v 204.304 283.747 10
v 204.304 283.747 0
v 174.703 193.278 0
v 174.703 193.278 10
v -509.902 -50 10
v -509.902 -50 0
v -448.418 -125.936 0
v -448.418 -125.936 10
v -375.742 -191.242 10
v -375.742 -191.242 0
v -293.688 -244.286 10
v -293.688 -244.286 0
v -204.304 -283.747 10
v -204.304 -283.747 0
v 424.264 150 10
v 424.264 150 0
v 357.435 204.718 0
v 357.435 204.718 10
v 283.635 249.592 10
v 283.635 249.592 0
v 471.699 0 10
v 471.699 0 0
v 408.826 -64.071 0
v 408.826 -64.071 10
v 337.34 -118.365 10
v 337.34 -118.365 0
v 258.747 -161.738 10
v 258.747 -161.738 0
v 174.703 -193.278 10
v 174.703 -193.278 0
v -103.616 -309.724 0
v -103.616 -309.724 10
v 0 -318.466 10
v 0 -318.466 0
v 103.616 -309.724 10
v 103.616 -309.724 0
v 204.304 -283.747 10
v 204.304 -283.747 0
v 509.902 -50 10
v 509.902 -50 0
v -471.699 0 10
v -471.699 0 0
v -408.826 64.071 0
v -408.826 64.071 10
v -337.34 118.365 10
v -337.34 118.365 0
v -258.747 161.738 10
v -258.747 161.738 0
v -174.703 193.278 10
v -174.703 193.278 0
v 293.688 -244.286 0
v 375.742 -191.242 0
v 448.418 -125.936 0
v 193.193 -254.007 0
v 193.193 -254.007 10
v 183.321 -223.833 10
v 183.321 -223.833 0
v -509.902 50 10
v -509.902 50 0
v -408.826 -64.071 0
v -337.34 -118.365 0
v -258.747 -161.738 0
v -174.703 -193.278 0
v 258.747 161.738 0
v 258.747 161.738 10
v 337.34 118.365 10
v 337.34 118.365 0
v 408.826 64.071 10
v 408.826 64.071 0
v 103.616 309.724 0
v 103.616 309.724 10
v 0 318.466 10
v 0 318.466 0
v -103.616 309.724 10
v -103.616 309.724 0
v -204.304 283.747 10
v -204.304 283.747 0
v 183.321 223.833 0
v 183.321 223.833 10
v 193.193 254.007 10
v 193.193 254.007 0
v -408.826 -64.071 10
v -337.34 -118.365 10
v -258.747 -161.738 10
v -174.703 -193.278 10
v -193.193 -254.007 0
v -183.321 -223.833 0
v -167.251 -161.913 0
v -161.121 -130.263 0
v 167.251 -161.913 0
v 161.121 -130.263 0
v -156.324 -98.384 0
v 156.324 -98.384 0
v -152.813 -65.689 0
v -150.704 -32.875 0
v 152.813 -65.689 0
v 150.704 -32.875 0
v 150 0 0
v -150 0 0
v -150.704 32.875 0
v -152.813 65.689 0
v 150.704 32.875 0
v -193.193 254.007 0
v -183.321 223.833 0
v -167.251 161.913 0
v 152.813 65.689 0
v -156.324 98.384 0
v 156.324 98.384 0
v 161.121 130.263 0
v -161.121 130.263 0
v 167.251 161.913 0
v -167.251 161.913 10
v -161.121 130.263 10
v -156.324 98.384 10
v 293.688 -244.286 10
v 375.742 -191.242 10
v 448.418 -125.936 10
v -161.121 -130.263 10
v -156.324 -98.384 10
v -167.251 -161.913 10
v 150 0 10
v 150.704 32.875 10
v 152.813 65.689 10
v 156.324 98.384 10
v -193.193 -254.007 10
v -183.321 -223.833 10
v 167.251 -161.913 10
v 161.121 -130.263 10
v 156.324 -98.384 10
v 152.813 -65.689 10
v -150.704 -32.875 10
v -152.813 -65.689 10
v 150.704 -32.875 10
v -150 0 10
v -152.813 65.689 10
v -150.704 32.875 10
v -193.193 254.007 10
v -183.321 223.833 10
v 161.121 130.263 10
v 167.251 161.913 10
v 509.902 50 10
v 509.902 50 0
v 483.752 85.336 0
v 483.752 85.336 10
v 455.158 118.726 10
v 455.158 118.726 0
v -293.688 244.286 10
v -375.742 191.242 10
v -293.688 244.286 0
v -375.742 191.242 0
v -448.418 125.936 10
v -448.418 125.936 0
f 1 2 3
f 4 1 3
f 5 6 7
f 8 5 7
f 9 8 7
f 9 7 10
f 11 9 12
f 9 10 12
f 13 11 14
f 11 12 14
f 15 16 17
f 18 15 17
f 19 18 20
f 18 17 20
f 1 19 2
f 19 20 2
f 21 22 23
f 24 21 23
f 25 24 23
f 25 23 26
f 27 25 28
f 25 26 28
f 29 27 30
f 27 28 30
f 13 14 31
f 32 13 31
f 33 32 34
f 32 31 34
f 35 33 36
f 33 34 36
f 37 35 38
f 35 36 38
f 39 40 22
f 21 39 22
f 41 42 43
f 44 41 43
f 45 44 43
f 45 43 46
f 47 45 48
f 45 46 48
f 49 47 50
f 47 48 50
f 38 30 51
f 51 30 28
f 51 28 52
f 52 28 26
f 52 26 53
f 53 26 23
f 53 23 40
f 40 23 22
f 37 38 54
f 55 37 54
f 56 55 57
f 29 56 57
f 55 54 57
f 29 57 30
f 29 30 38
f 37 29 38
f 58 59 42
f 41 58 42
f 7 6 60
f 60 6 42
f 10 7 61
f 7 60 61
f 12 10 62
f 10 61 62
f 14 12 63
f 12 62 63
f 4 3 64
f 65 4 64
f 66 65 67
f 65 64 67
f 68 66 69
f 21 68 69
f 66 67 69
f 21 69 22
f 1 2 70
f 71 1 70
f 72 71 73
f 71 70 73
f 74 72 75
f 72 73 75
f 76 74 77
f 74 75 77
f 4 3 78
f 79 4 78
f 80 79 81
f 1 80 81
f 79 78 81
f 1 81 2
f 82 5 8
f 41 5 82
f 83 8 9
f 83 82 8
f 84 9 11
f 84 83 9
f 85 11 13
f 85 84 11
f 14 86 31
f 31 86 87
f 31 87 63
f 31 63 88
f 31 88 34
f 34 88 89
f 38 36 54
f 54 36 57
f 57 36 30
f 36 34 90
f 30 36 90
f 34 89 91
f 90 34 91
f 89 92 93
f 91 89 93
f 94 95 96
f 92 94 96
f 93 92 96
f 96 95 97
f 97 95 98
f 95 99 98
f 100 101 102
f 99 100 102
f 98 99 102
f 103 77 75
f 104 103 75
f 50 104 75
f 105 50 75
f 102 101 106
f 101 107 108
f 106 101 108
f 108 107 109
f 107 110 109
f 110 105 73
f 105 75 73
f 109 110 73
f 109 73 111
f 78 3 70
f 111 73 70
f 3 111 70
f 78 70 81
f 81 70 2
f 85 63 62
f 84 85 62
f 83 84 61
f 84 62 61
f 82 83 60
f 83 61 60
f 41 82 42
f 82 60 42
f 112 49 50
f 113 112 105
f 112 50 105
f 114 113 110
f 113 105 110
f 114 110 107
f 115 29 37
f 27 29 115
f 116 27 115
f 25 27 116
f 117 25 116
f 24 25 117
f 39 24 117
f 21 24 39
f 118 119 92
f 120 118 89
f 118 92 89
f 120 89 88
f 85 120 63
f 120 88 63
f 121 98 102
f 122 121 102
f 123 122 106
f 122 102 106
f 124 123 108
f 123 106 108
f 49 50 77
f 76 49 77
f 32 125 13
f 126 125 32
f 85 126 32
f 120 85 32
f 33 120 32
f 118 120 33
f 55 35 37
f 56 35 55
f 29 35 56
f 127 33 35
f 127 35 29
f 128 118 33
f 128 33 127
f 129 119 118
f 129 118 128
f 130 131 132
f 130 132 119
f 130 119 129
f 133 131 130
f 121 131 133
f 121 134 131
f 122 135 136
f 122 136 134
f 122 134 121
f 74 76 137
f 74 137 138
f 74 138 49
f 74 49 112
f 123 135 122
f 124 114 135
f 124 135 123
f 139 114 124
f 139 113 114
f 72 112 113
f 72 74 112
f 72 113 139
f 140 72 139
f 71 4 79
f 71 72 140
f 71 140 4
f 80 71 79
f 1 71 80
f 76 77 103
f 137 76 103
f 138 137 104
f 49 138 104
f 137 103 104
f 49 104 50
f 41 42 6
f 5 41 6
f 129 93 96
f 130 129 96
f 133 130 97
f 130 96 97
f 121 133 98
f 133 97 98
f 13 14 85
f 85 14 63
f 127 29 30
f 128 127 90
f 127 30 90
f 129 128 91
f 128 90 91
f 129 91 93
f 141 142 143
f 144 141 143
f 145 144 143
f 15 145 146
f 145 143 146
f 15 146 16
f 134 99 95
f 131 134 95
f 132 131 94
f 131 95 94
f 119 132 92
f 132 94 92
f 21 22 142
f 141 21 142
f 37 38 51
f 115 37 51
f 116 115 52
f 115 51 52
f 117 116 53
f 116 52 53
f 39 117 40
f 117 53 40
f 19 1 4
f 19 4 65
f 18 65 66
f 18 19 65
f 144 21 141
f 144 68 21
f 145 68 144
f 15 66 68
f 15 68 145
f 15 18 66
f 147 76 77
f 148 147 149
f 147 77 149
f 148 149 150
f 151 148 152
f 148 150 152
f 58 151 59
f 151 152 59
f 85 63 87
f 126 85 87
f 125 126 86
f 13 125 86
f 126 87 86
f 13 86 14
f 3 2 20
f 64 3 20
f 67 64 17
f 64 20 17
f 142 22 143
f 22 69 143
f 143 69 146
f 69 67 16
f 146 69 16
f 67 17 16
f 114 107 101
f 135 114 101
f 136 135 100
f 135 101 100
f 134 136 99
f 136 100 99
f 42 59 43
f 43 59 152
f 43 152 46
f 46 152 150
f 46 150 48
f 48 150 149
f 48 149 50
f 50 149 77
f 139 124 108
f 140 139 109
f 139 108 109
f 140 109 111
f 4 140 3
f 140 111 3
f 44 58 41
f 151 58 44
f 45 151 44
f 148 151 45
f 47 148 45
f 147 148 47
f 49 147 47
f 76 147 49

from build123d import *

# Parameters (mm, degrees)
F1_DEPTH = 10
F2_DEPTH = 10


# Not quite as in the source:
# - a feature names something its author has since deleted; it is built from what else it names


with BuildPart() as f1:
    # F0 (on Top) → F1 (new body)
    with BuildSketch(Plane.XY):
        with BuildLine():
            ThreePointArc((-424.2640687119, 50), (-448.6785937405, 74.3387267802), (-471.6990566028, 100))
            ThreePointArc((-471.6990566028, 100), (-491.4368064238, 75.4861719051), (-509.9019513593, 50))
            Line((-509.9019513593, 50), (-471.6990566028, 0))
            ThreePointArc((-471.6990566028, 0), (-448.6785937405, 25.6612732197), (-424.2640687119, 50))
        make_face()
        with BuildLine():
            ThreePointArc((-364.005494464, 100), (-394.9268616559, 124.0454076883), (-424.2640687119, 150))
            ThreePointArc((-424.2640687119, 150), (-448.6785937405, 125.6612732197), (-471.6990566028, 100))
            ThreePointArc((-471.6990566028, 100), (-448.6785937405, 74.3387267802), (-424.2640687119, 50))
            ThreePointArc((-424.2640687119, 50), (-394.9268616559, 75.9545923117), (-364.005494464, 100))
        make_face()
        with BuildLine():
            Line((-174.7028906779, 193.2780966703), (-204.3036394289, 283.7465399607))
            ThreePointArc((-204.3036394289, 283.7465399607), (-321.3197397721, 228.444533355), (-424.2640687119, 150))
            ThreePointArc((-424.2640687119, 150), (-394.9268616559, 124.0454076883), (-364.005494464, 100))
            ThreePointArc((-364.005494464, 100), (-273.362180788, 154.7730329737), (-174.7028906779, 193.2780966703))
        make_face()
    extrude(amount=F1_DEPTH)


with BuildPart() as f1b:
    # F0 (on Top) → F1, piece 2 (new body)
    with BuildSketch(Plane.XY):
        with BuildLine():
            ThreePointArc((471.6990566028, 100), (448.6785937405, 125.6612732197), (424.2640687119, 150))
            ThreePointArc((424.2640687119, 150), (394.9268616559, 124.0454076883), (364.005494464, 100))
            ThreePointArc((364.005494464, 100), (394.9268616559, 75.9545923117), (424.2640687119, 50))
            ThreePointArc((424.2640687119, 50), (448.6785937405, 74.3387267802), (471.6990566028, 100))
        make_face()
        with BuildLine():
            ThreePointArc((509.9019513593, 50), (491.4368064238, 75.4861719051), (471.6990566028, 100))
            ThreePointArc((471.6990566028, 100), (448.6785937405, 74.3387267802), (424.2640687119, 50))
            ThreePointArc((424.2640687119, 50), (448.6785937405, 25.6612732197), (471.6990566028, 0))
            Line((471.6990566028, 0), (509.9019513593, 50))
        make_face()
        with BuildLine():
            ThreePointArc((424.2640687119, 150), (321.3197397721, 228.444533355), (204.3036394289, 283.7465399607))
            Line((204.3036394289, 283.7465399607), (174.7028906779, 193.2780966703))
            ThreePointArc((174.7028906779, 193.2780966703), (273.362180788, 154.7730329737), (364.005494464, 100))
            ThreePointArc((364.005494464, 100), (394.9268616559, 124.0454076883), (424.2640687119, 150))
        make_face()
    extrude(amount=F1_DEPTH)


with BuildPart() as f1c:
    # F0 (on Top) → F1, piece 3 (new body)
    with BuildSketch(Plane.XY):
        with BuildLine():
            ThreePointArc((-424.2640687119, -50), (-448.6785937405, -25.6612732197), (-471.6990566028, 0))
            Line((-471.6990566028, 0), (-509.9019513593, -50))
            ThreePointArc((-509.9019513593, -50), (-491.4368064238, -75.4861719051), (-471.6990566028, -100))
            ThreePointArc((-471.6990566028, -100), (-448.6785937405, -74.3387267802), (-424.2640687119, -50))
        make_face()
        with BuildLine():
            ThreePointArc((-174.7028906779, -193.2780966703), (-307.9326352574, -136.3557514779), (-424.2640687119, -50))
            ThreePointArc((-424.2640687119, -50), (-448.6785937405, -74.3387267802), (-471.6990566028, -100))
            ThreePointArc((-471.6990566028, -100), (-350.2650553473, -209.7199142692), (-204.3036394289, -283.7465399607))
            Line((-204.3036394289, -283.7465399607), (-174.7028906779, -193.2780966703))
        make_face()
    extrude(amount=F1_DEPTH)


with BuildPart() as f1d:
    # F0 (on Top) → F1, piece 4 (new body)
    with BuildSketch(Plane.XY):
        with BuildLine():
            Line((509.9019513593, -50), (471.6990566028, 0))
            ThreePointArc((471.6990566028, 0), (448.6785937405, -25.6612732197), (424.2640687119, -50))
            ThreePointArc((424.2640687119, -50), (448.6785937405, -74.3387267802), (471.6990566028, -100))
            ThreePointArc((471.6990566028, -100), (491.4368064238, -75.4861719051), (509.9019513593, -50))
        make_face()
        with BuildLine():
            ThreePointArc((471.6990566028, -100), (448.6785937405, -74.3387267802), (424.2640687119, -50))
            ThreePointArc((424.2640687119, -50), (307.9326352574, -136.3557514779), (174.7028906779, -193.2780966703))
            Line((174.7028906779, -193.2780966703), (204.3036394289, -283.7465399607))
            ThreePointArc((204.3036394289, -283.7465399607), (350.2650553473, -209.7199142692), (471.6990566028, -100))
        make_face()
    extrude(amount=F1_DEPTH)


with BuildPart() as f2:
    # F0 (on Top) → F2 (new body)
    with BuildSketch(Plane.XY):
        with BuildLine():
            ThreePointArc((174.7028906779, 193.2780966703), (188.1011567973, 238.9710799865), (204.3036394289, 283.7465399607))
            ThreePointArc((204.3036394289, 283.7465399607), (0, 318.4658438426), (-204.3036394289, 283.7465399607))
            ThreePointArc((-204.3036394289, 283.7465399607), (-188.1011567973, 238.9710799865), (-174.7028906779, 193.2780966703))
            ThreePointArc((-174.7028906779, 193.2780966703), (0, 218.4658438426), (174.7028906779, 193.2780966703))
        make_face()
        with BuildLine():
            ThreePointArc((156.3238407432, 98.383536551), (164.0199022999, 146.1200685822), (174.7028906779, 193.2780966703))
            ThreePointArc((174.7028906779, 193.2780966703), (0, 218.4658438426), (-174.7028906779, 193.2780966703))
            ThreePointArc((-174.7028906779, 193.2780966703), (-164.0199022999, 146.1200685822), (-156.3238407432, 98.383536551))
            ThreePointArc((-156.3238407432, 98.383536551), (0, 118.4658438426), (156.3238407431, 98.383536551))
        make_face()
        with BuildLine():
            ThreePointArc((150, 0), (151.5825897901, 49.2932835842), (156.3238407432, 98.383536551))
            ThreePointArc((156.3238407431, 98.383536551), (0, 118.4658438426), (-156.3238407432, 98.383536551))
            ThreePointArc((-156.3238407432, 98.383536551), (-151.5825897901, 49.2932835842), (-150, 0))
            ThreePointArc((-150, 0), (0, -18.4658438426), (150, 0))
        make_face()
        with BuildLine():
            ThreePointArc((156.3238407432, -98.383536551), (151.5825897901, -49.2932835842), (150, 0))
            ThreePointArc((150, 0), (0, -18.4658438426), (-150, 0))
            ThreePointArc((-150, 0), (-151.5825897901, -49.2932835842), (-156.3238407432, -98.383536551))
            ThreePointArc((-156.3238407432, -98.383536551), (0, -118.4658438426), (156.3238407431, -98.383536551))
        make_face()
        with BuildLine():
            ThreePointArc((174.7028906779, -193.2780966703), (164.0199022999, -146.1200685822), (156.3238407432, -98.383536551))
            ThreePointArc((156.3238407431, -98.383536551), (0, -118.4658438426), (-156.3238407432, -98.383536551))
            ThreePointArc((-156.3238407432, -98.383536551), (-164.0199022999, -146.1200685822), (-174.7028906779, -193.2780966703))
            ThreePointArc((-174.7028906779, -193.2780966703), (0, -218.4658438426), (174.7028906779, -193.2780966703))
        make_face()
        with BuildLine():
            ThreePointArc((204.3036394289, -283.7465399607), (188.1011567973, -238.9710799865), (174.7028906779, -193.2780966703))
            ThreePointArc((174.7028906779, -193.2780966703), (0, -218.4658438426), (-174.7028906779, -193.2780966703))
            ThreePointArc((-174.7028906779, -193.2780966703), (-188.1011567973, -238.9710799865), (-204.3036394289, -283.7465399607))
            ThreePointArc((-204.3036394289, -283.7465399607), (0, -318.4658438426), (204.3036394289, -283.7465399607))
        make_face()
    extrude(amount=F2_DEPTH)


solid = Compound([f1.part, f1b.part, f1c.part, f1d.part, f2.part])
